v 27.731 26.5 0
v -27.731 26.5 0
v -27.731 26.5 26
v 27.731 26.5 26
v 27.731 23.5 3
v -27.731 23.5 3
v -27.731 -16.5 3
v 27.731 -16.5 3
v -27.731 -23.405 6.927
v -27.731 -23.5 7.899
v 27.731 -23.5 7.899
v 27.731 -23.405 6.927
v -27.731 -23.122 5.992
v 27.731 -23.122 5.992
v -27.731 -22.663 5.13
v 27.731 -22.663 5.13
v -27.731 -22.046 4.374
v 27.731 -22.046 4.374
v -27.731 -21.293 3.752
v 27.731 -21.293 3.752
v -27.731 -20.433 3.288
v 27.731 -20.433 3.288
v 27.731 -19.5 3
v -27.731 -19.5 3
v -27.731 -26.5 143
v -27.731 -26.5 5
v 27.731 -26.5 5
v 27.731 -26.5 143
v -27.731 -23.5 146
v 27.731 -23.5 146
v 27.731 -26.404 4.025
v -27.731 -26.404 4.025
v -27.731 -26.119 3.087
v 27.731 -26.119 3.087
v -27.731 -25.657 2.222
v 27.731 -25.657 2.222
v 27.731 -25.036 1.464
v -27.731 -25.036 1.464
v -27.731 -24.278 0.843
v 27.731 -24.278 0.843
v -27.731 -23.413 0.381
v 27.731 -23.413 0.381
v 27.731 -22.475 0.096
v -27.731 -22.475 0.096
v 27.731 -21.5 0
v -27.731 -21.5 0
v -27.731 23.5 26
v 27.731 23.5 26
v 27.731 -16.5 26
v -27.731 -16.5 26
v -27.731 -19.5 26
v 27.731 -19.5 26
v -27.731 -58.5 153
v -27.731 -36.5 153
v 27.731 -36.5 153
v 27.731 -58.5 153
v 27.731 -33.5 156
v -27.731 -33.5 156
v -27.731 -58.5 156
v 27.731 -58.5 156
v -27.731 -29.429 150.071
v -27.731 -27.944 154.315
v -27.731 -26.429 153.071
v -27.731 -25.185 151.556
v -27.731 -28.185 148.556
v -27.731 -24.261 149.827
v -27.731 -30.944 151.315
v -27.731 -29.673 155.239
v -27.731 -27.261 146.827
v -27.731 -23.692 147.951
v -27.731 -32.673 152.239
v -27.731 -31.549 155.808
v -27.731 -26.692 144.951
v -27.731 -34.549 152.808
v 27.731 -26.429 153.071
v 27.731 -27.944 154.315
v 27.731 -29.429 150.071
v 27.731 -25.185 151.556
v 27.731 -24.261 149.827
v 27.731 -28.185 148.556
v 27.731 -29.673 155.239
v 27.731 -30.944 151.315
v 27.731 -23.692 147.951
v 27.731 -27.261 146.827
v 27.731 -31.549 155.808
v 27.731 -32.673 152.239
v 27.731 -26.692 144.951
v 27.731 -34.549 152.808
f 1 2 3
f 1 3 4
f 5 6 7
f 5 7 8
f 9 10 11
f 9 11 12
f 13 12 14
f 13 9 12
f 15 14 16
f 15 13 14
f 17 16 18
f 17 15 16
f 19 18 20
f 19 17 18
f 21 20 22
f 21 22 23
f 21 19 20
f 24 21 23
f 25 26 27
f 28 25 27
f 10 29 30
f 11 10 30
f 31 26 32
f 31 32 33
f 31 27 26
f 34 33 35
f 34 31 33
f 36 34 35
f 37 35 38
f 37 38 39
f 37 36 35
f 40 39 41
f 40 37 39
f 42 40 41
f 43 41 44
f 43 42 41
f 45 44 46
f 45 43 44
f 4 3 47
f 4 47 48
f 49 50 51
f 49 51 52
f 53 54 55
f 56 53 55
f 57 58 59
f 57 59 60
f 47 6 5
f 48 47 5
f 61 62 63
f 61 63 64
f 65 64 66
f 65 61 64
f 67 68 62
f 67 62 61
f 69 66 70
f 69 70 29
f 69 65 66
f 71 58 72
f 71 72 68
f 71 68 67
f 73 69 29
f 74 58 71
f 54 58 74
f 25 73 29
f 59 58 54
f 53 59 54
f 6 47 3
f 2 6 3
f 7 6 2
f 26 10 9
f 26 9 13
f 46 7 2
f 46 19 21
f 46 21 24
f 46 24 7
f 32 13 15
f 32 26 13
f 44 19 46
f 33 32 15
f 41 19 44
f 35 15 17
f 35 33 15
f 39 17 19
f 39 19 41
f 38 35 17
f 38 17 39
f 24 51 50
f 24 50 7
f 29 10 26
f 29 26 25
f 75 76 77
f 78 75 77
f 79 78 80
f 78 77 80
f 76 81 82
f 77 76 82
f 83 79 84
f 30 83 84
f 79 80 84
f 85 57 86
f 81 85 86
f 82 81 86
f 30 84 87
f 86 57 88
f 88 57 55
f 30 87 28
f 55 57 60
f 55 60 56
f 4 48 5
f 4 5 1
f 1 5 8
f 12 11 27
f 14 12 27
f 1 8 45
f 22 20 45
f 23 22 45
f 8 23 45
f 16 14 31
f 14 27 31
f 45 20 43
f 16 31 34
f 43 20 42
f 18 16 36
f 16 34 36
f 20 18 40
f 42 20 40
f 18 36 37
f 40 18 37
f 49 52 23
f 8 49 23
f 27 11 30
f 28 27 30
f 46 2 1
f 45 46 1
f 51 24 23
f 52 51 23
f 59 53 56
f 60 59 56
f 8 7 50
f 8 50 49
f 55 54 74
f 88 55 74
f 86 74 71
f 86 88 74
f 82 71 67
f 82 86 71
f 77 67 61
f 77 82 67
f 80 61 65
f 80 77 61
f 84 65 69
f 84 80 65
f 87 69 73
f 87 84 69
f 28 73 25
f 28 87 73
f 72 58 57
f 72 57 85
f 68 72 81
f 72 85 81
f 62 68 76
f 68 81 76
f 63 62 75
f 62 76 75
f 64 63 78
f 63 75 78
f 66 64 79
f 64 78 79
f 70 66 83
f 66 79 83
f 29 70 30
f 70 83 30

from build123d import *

# Parameters (mm, degrees)
SKETCH6_W           = 55.461011284
SKETCH6_H           = 53
BOSS_EXTRUDE5_DEPTH = 3
SKETCH7_W           = 55.461011284
SKETCH7_H           = 3
BOSS_EXTRUDE6_DEPTH = 23
SKETCH8_W           = 55.461011284
SKETCH8_H           = 3
BOSS_EXTRUDE7_DEPTH = 150
SKETCH9_W           = 55.461011284
SKETCH9_H           = 35
BOSS_EXTRUDE8_DEPTH = 3
FILLET2_R           = 10
FILLET3_R           = 10
FILLET5_R           = 5
FILLET6_R           = 5


with BuildPart() as part:
    # Sketch6 → Boss-Extrude5 (new body)
    with BuildSketch(Plane.XY):
        Rectangle(SKETCH6_W, SKETCH6_H)
    extrude(amount=BOSS_EXTRUDE5_DEPTH)

    # Sketch7 → Boss-Extrude6 (add)
    with BuildSketch(Plane.XY.offset(3)):
        with Locations((0, 25)):
            Rectangle(SKETCH7_W, SKETCH7_H)
        with Locations((0, -18)):
            Rectangle(SKETCH7_W, SKETCH7_H)
    extrude(amount=BOSS_EXTRUDE6_DEPTH)

    # Sketch8 → Boss-Extrude7 (add)
    with BuildSketch(Plane.XY.offset(3)):
        with Locations((0, -25)):
            Rectangle(SKETCH8_W, SKETCH8_H)
    extrude(amount=BOSS_EXTRUDE7_DEPTH)

    # Sketch9 → Boss-Extrude8 (add)
    with BuildSketch(Plane.XY.offset(153)):
        with Locations((0, -41)):
            Rectangle(SKETCH9_W, SKETCH9_H)
    extrude(amount=BOSS_EXTRUDE8_DEPTH)

    # Fillet2
    fillet2_edges = [part.edges().sort_by_distance(p)[0] for p in [
        (0, -26.5, 153),
    ]]
    fillet(fillet2_edges, radius=FILLET2_R)

    # Fillet3
    fillet3_edges = [part.edges().sort_by_distance(p)[0] for p in [
        (0, -23.5, 156),
    ]]
    fillet(fillet3_edges, radius=FILLET3_R)

    # Fillet5
    fillet5_edges = [part.edges().sort_by_distance(p)[0] for p in [
        (0, -26.5, 0),
    ]]
    fillet(fillet5_edges, radius=FILLET5_R)

    # Fillet6
    # the kernel refuses this fillet: 5 mm, written as the material it adds along each edge
    with BuildSketch(Plane(origin=(-27.730505642, -23.5, 3), x_dir=(0, 0, 1), z_dir=(1, 0, 0))) as fillet6_piece_1:
        with BuildLine():
            CenterArc((4.898979486, -5), FILLET6_R, 90, 78.463040967)
            Line((0, -4), (-0.09797959, -3.98))
            ThreePointArc((-0.09797959, -3.98), (-0.1, -2), (-0.1, 0))
            Line((-0.1, 0), (0, 0.1))
            Line((0, 0.1), (4.898979486, 0.1))
            Line((4.898979486, 0.1), (4.898979486, 0))
        make_face()
    extrude(amount=55.461011285)


solid = part.part
